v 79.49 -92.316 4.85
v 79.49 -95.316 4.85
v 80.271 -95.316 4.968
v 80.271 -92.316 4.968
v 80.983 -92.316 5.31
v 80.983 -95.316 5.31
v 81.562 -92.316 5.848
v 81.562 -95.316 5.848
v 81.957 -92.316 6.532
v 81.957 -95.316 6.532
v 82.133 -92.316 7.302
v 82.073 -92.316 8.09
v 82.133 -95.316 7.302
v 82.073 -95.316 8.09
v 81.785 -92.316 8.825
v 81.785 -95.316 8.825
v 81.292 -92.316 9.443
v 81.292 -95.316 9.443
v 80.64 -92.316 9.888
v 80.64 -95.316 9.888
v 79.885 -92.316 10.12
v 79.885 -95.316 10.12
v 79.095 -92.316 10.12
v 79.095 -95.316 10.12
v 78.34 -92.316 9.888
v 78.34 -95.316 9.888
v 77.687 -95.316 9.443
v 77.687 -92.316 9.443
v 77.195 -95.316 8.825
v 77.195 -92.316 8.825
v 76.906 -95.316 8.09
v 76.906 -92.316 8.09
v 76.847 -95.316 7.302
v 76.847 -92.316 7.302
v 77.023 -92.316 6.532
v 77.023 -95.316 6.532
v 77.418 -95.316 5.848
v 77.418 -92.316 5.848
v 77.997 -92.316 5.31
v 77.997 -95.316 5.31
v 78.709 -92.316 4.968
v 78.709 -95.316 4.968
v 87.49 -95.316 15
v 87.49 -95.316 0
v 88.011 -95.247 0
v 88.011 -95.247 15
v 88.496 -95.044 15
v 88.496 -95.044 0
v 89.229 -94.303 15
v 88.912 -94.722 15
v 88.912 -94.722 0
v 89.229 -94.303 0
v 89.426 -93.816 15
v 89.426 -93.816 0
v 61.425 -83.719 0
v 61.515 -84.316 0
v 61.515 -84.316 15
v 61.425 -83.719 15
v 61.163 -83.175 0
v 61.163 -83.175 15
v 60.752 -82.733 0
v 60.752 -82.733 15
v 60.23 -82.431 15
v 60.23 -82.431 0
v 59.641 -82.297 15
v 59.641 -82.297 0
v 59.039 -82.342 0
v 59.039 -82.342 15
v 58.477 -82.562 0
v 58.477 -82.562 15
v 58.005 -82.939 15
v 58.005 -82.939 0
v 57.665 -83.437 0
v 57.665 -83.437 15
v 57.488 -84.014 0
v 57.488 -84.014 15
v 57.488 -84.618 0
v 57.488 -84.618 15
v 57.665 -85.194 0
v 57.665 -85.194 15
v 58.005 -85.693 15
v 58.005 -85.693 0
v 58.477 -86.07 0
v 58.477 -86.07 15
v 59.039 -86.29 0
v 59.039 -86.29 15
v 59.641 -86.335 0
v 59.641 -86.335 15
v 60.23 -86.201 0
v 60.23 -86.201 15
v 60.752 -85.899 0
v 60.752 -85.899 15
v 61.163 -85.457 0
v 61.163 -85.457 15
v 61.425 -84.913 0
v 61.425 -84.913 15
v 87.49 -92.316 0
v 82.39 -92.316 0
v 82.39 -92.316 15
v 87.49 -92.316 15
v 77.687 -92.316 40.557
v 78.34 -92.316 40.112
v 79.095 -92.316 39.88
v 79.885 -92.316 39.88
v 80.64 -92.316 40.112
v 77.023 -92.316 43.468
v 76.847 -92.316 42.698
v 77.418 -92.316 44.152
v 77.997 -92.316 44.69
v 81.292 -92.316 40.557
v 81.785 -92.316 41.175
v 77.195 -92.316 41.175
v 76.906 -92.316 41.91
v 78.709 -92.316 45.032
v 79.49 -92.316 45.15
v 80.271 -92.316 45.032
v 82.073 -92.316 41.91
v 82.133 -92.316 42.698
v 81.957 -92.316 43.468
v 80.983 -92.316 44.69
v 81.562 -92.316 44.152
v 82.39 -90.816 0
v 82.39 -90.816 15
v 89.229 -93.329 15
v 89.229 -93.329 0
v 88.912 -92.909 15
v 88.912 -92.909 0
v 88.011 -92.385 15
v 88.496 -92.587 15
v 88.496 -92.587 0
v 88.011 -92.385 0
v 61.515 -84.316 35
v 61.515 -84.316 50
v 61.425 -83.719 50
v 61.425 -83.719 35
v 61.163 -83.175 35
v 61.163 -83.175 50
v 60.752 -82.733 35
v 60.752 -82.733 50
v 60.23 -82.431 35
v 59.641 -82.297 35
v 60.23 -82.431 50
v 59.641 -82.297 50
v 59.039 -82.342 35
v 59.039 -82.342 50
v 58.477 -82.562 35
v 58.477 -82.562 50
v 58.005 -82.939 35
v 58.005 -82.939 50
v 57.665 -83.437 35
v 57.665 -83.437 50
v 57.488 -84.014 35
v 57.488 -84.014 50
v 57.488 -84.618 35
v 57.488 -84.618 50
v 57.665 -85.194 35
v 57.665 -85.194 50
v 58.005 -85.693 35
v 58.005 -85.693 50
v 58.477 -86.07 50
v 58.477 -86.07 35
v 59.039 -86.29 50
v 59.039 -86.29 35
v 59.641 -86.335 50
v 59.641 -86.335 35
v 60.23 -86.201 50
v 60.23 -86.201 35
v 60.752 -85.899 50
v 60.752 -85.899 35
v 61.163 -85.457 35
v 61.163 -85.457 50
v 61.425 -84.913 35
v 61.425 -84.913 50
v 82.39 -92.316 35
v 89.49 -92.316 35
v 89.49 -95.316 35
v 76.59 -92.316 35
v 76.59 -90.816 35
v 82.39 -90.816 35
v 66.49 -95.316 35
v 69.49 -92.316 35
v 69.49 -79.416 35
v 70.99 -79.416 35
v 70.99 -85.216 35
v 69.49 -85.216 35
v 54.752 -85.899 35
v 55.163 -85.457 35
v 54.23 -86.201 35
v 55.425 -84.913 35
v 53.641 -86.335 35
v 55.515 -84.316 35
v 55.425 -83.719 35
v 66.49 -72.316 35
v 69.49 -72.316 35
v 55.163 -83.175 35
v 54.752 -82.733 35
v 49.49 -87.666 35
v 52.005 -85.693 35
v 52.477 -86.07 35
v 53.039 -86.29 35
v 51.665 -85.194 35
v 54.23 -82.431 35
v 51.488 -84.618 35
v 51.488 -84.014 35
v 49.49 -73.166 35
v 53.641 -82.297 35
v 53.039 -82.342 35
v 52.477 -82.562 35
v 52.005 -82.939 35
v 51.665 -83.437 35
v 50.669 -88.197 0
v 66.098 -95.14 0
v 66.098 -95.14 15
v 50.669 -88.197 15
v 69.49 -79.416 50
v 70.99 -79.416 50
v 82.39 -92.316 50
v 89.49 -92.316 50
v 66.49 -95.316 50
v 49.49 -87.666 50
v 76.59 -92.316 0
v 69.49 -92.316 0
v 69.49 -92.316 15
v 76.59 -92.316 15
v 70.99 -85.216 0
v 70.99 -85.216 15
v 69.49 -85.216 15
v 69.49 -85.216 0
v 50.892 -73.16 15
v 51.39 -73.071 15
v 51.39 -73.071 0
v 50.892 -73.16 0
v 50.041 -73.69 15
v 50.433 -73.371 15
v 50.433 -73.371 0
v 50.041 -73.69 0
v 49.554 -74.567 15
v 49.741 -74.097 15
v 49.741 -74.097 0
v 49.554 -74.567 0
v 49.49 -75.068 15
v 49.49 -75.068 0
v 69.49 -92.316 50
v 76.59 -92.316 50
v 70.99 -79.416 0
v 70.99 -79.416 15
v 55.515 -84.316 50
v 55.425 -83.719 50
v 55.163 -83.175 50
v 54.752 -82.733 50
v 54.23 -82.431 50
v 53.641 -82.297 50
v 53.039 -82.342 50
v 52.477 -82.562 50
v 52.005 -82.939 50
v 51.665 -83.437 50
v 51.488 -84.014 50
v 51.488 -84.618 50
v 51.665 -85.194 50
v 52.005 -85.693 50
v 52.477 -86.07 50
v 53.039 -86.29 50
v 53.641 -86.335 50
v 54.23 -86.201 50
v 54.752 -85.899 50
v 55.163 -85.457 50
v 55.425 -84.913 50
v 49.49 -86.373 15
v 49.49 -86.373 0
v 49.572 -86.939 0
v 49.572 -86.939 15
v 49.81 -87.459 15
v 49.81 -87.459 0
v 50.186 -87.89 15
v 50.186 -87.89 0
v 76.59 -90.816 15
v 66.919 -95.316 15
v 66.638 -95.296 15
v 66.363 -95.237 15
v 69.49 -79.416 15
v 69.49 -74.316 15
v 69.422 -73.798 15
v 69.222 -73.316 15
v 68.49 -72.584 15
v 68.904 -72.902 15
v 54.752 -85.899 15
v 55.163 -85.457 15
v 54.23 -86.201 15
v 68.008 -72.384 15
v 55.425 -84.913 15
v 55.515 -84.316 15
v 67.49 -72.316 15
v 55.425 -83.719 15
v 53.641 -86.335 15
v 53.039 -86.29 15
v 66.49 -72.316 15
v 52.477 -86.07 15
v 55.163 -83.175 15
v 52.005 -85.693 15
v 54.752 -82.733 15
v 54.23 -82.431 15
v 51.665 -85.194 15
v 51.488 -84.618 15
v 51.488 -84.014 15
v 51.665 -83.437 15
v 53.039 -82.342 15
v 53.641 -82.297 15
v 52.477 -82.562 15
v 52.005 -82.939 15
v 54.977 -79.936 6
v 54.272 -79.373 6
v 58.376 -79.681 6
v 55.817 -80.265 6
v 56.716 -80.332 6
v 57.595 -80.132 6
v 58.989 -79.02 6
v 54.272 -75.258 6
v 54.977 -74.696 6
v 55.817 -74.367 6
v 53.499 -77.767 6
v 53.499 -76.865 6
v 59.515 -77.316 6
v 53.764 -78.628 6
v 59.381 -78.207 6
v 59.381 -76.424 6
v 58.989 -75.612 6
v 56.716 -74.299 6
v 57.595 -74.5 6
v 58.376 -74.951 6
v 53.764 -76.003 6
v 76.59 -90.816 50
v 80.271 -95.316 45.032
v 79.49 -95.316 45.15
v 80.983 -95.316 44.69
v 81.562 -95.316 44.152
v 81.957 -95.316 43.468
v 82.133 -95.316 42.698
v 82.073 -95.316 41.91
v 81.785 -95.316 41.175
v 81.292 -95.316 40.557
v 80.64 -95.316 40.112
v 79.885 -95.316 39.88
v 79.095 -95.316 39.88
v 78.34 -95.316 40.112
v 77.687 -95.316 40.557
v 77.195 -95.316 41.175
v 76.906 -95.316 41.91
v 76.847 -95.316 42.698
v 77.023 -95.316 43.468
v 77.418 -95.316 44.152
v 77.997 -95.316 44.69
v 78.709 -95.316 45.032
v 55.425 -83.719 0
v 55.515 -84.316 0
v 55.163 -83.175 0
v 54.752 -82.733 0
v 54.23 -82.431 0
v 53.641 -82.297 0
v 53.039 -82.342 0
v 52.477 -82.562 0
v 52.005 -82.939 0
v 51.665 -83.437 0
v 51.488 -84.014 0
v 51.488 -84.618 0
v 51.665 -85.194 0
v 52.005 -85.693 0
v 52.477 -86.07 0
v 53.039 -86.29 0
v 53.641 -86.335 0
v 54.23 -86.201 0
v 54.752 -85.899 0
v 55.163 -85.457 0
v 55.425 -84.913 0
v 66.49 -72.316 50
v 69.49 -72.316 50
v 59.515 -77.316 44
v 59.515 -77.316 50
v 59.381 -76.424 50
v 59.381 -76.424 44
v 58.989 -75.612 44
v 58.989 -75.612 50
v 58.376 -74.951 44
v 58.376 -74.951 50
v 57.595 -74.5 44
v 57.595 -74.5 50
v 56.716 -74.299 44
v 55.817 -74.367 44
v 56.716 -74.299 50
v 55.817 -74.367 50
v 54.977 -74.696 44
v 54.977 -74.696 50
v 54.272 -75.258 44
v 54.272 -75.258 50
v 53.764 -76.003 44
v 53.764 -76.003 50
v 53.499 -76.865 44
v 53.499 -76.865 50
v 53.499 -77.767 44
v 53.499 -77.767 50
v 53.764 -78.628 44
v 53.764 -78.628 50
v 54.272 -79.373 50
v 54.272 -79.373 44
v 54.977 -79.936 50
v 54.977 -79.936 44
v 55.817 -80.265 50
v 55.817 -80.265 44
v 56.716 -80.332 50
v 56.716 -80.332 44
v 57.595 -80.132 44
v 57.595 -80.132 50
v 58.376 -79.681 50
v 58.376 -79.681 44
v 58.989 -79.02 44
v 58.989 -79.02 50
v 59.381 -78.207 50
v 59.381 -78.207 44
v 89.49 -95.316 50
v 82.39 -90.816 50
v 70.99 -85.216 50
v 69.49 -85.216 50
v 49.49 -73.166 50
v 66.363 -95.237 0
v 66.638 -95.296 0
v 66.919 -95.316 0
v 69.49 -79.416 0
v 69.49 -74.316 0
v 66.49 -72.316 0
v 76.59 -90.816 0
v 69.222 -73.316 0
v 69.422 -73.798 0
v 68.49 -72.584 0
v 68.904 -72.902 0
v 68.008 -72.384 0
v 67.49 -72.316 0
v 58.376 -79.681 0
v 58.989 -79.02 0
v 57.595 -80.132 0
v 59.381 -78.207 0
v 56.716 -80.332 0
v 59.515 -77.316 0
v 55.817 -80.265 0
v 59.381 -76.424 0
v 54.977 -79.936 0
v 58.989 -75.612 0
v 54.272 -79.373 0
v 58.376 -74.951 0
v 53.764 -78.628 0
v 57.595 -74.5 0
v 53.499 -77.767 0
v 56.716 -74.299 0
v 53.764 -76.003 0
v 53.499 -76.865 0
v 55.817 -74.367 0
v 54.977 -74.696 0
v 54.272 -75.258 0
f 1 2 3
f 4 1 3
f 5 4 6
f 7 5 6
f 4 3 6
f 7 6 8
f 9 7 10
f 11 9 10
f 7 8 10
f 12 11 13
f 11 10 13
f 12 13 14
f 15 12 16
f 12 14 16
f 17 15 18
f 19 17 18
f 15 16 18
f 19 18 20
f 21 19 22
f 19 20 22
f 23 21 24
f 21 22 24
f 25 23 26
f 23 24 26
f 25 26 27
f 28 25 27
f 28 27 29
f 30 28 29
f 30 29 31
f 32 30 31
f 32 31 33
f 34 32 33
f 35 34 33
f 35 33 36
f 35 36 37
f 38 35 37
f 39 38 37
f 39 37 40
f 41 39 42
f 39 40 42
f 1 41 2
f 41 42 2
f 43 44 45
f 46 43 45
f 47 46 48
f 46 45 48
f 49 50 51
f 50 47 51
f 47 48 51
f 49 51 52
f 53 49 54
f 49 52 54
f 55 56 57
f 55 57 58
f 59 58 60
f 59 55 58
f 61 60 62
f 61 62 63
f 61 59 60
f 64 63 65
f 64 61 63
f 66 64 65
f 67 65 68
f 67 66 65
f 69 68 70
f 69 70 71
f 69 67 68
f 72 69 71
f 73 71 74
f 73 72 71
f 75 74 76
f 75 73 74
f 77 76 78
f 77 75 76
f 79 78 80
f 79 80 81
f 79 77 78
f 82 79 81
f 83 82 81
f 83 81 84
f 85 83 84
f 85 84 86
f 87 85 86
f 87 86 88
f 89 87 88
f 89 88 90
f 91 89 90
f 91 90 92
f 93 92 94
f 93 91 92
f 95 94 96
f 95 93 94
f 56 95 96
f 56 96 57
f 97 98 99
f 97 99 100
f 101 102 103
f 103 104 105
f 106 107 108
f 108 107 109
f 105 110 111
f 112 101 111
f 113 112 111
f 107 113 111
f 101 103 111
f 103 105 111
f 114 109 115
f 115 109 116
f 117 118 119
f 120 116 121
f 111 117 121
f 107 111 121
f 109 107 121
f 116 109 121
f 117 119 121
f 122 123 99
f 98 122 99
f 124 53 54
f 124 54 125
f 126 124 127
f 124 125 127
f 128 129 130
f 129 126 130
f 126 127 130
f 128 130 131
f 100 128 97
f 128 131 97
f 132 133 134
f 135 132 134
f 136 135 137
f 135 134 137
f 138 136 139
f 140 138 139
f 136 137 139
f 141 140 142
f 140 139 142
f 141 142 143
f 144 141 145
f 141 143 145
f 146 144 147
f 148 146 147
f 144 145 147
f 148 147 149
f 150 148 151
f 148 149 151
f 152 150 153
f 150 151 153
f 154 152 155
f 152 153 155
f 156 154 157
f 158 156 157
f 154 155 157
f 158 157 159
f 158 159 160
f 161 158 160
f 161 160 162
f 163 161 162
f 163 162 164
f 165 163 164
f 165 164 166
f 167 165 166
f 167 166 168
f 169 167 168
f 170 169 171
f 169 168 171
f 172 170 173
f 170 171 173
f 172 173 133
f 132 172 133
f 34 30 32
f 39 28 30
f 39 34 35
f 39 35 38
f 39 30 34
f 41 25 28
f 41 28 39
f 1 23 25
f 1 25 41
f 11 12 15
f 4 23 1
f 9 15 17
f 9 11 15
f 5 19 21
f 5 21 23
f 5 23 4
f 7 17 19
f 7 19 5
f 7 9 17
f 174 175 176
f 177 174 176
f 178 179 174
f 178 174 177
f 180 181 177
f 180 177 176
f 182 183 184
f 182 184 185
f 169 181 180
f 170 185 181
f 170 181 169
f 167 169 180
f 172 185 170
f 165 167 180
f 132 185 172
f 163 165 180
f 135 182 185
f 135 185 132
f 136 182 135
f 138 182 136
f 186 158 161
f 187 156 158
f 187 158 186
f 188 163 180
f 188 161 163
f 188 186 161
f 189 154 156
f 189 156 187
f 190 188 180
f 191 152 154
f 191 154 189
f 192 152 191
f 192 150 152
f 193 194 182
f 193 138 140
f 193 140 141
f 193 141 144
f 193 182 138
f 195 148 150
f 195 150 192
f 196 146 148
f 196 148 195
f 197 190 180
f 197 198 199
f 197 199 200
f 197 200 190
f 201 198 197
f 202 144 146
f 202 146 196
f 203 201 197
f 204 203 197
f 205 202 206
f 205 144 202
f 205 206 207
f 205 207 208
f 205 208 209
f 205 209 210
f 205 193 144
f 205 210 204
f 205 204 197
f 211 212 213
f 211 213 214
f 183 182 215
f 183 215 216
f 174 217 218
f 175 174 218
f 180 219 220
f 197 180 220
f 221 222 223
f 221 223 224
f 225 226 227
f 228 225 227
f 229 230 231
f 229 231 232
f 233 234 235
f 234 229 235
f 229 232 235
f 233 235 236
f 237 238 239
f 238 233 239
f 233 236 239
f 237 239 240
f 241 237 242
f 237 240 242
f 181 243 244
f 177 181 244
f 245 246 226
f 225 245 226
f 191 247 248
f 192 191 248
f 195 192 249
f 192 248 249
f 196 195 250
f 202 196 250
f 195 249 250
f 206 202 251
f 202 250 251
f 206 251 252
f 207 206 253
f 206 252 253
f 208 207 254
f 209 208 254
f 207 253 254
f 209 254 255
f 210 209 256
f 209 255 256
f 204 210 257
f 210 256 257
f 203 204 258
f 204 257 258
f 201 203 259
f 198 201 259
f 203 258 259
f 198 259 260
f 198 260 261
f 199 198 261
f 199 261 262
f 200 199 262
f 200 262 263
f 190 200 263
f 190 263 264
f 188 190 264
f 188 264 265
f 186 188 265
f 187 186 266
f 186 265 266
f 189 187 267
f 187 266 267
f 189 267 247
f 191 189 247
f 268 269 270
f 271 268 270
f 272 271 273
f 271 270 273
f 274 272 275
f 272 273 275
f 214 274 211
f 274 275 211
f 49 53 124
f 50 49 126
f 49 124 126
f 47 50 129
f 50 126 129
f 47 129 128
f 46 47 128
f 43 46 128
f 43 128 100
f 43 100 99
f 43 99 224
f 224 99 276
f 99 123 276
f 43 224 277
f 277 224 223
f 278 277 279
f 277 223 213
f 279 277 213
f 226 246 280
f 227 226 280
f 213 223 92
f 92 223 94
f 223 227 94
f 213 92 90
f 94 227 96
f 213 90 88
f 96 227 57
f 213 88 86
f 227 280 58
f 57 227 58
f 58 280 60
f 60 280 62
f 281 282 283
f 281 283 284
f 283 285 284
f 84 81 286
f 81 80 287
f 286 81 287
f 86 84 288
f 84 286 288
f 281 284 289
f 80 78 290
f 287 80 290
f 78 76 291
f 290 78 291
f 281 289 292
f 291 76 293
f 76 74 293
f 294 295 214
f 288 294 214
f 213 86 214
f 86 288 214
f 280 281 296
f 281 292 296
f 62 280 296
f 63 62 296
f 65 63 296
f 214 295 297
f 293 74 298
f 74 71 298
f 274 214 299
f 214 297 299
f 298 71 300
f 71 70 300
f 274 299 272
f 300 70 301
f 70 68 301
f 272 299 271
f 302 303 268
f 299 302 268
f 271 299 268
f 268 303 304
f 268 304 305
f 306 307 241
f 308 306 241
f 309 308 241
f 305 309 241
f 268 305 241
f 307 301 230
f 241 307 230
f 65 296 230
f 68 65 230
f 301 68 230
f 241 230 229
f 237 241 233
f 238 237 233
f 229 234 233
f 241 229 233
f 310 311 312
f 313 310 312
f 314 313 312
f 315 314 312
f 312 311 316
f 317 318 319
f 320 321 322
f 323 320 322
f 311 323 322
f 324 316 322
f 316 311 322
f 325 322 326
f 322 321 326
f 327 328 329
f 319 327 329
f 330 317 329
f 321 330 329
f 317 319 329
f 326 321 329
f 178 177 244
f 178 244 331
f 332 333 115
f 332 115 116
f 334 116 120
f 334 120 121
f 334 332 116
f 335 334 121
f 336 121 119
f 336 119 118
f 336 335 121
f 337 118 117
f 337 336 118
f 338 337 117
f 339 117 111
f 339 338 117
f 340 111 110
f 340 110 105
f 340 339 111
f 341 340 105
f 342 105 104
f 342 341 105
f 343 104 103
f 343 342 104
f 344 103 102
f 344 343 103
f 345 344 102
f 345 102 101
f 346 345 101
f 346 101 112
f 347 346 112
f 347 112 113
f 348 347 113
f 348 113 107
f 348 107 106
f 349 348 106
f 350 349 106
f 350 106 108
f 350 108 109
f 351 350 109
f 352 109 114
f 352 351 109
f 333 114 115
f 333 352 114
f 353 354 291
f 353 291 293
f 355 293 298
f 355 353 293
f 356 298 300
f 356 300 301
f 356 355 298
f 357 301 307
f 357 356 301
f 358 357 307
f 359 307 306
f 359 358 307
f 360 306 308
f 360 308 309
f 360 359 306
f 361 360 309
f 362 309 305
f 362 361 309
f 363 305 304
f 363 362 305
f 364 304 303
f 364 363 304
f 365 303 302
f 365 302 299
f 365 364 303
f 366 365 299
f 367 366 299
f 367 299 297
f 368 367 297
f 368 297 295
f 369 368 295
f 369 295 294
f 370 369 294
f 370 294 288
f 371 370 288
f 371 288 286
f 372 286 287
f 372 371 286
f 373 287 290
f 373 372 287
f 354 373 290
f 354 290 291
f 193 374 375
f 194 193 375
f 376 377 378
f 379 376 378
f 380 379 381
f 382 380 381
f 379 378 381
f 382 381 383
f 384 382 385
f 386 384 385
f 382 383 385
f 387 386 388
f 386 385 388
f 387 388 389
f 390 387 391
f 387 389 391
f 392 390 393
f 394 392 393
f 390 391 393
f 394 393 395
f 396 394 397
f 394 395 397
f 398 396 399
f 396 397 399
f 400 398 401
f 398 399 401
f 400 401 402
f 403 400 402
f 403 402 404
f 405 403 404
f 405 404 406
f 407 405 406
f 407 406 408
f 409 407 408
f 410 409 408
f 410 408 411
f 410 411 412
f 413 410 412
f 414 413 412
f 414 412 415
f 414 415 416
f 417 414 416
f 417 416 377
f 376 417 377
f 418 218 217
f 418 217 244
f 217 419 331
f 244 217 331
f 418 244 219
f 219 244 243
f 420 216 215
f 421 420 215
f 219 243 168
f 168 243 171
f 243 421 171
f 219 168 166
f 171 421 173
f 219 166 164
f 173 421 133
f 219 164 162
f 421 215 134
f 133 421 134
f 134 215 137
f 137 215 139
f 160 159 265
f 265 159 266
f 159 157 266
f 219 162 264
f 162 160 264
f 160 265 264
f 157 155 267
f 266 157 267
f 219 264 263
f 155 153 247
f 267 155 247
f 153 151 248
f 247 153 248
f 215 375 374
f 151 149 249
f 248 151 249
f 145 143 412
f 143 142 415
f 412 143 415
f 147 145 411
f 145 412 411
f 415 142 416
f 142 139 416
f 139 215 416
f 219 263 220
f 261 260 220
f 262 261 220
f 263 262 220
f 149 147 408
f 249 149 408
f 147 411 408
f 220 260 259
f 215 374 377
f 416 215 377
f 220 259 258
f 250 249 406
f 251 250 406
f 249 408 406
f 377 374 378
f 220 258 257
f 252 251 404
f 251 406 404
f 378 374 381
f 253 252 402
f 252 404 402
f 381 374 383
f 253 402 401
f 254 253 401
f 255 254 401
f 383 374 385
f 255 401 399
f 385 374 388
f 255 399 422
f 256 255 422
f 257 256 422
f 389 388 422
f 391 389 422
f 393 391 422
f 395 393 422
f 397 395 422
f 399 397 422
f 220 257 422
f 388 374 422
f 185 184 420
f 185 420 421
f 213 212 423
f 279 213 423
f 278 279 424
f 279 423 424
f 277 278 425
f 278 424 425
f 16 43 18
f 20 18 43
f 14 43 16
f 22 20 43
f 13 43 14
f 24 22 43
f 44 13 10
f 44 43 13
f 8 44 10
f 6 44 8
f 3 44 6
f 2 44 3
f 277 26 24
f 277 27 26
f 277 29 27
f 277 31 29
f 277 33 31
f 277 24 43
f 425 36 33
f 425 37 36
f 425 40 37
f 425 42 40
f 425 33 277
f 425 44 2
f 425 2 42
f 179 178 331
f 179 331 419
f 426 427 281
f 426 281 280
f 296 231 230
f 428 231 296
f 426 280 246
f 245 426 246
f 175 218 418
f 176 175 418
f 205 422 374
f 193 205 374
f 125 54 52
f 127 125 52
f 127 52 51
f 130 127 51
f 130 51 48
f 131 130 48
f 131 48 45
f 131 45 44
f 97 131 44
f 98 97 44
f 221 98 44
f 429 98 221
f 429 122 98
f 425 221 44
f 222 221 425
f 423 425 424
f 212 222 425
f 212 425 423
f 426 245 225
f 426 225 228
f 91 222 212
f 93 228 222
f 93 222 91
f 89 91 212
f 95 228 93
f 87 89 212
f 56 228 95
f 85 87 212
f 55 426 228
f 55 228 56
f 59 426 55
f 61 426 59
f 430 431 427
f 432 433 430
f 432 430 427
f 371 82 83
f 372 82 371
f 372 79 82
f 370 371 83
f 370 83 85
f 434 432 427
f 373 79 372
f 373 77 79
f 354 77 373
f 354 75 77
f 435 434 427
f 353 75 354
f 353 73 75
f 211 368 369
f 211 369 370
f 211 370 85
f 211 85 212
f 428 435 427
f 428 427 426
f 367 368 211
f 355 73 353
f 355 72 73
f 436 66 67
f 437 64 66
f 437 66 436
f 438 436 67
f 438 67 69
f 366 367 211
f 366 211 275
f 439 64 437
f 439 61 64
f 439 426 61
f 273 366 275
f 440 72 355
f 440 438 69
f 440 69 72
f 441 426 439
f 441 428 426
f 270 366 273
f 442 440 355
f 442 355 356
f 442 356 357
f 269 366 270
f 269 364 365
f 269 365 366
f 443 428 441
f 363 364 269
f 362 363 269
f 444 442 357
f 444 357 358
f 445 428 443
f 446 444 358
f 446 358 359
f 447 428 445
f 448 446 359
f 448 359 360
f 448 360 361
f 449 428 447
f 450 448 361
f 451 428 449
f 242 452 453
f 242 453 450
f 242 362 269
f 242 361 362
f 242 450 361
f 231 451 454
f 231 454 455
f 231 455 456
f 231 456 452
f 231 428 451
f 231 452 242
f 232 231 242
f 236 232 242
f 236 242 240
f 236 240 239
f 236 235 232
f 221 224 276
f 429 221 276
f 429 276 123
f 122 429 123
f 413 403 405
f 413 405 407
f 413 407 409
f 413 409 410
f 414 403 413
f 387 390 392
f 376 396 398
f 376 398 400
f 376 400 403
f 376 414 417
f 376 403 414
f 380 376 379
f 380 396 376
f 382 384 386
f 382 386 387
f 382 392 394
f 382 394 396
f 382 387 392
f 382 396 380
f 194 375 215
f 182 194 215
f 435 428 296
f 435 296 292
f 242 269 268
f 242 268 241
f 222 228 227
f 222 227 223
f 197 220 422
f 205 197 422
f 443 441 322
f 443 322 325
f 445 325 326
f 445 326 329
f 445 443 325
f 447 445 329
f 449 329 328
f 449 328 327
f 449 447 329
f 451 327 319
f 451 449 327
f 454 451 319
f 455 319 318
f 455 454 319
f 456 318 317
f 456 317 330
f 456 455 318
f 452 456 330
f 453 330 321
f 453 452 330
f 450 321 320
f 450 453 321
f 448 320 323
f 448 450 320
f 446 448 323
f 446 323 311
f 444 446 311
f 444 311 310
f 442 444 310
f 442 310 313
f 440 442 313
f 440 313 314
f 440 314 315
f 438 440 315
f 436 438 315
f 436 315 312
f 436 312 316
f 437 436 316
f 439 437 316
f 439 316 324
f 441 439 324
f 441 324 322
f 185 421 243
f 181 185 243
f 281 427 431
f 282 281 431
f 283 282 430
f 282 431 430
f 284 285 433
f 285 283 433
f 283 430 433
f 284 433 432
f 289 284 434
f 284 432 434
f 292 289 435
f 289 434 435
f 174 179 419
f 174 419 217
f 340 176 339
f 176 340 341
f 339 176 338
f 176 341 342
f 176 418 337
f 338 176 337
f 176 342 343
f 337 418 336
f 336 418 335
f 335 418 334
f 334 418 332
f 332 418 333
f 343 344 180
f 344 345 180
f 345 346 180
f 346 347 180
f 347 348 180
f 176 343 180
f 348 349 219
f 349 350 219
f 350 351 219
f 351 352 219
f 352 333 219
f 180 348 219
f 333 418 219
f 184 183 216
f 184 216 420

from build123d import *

# Parameters (mm, degrees)
SKETCH1_R           = 3.025
SKETCH1_R_2         = 2.025
BOSS_EXTRUDE1_DEPTH = 15
BOSS_EXTRUDE2_START = 6
SKETCH1_2_R         = 3.025
BOSS_EXTRUDE2_DEPTH = 9
SKETCH2_R           = 2.65
CUT_EXTRUDE1_DEPTH  = 3
FILLET1_R           = 2


with BuildPart() as part:
    # Sketch1 → Boss-Extrude1 (new body)
    with BuildSketch(Plane.XY):
        Polygon((66.489922843, -72.31585339), (69.489922843, -72.31585339), (69.489922843, -79.41585339), (70.989922843, -79.41585339), (70.989922843, -85.21585339), (69.489922843, -85.21585339), (69.489922843, -92.31585339), (76.589922843, -92.31585339), (76.589922843, -90.81585339), (82.389922843, -90.81585339), (82.389922843, -92.31585339), (89.489922843, -92.31585339), (89.489922843, -95.31585339), (66.489922843, -95.31585339), (49.489922843, -87.66585339), (49.489922843, -73.16585339), align=None)
        with Locations((56.489922843, -77.31585339)):
            Circle(SKETCH1_R, mode=Mode.SUBTRACT)
        with Locations((53.489922843, -84.31585339)):
            Circle(SKETCH1_R_2, mode=Mode.SUBTRACT)
        with Locations((59.489922843, -84.31585339)):
            Circle(SKETCH1_R_2, mode=Mode.SUBTRACT)
    extrude(amount=BOSS_EXTRUDE1_DEPTH)

    # Sketch1<2> → Boss-Extrude2 (add)
    with BuildSketch(Plane.XY.offset(BOSS_EXTRUDE2_START)):
        with Locations((56.489922843, -77.31585339)):
            Circle(SKETCH1_2_R)
    extrude(amount=BOSS_EXTRUDE2_DEPTH)

    # Sketch2 → Cut-Extrude1 (cut)
    with BuildSketch(Plane.XZ.offset(95.31585339)):
        with Locations(Location((79.489922843, 7.5, 0), (0, 0, 270))):
            Circle(SKETCH2_R)
    extrude(amount=-CUT_EXTRUDE1_DEPTH, mode=Mode.SUBTRACT)


with BuildPart() as body_2:
    # Mirror4: mirrored copy
    add(part.part.mirror(Plane.XY.offset(25)))


with BuildPart() as part_1:
    add(part.part)

    # Fillet1
    # the kernel refuses this fillet: 2 mm, written as the material it takes off along each edge
    with BuildSketch(Plane(origin=(89.489922843, -95.31585339, -5), x_dir=(0, 1, 0), z_dir=(0, 0, 1)), Plane(origin=(89.489922843, -92.31585339, -5), x_dir=(-1, 0, 0), z_dir=(0, 0, 1)), Plane(origin=(69.489922843, -72.31585339, -5), x_dir=(-1, 0, 0), z_dir=(0, 0, 1))) as fillet1_piece_1:
        with BuildLine():
            CenterArc((FILLET1_R, FILLET1_R), FILLET1_R, 180, 90)
            Line((0, FILLET1_R), (0, 0))
            Line((0, 0), (FILLET1_R, 0))
        make_face()
    extrude(amount=25, mode=Mode.SUBTRACT)
    with BuildSketch(Plane(origin=(66.489922843, -95.31585339, -1.073173444), x_dir=(1, 0, 0), z_dir=(0, 0, 1))) as fillet1_piece_2:
        with BuildLine():
            CenterArc((FILLET1_R * 0.214634688829, FILLET1_R), FILLET1_R, 245.772254682, 24.227745318)
            Line((-FILLET1_R * 0.1957299885, FILLET1_R * 0.0880784948249), (0, 0))
            Line((0, 0), (FILLET1_R * 0.214634688829, 0))
        make_face()
    extrude(amount=17.146346888, mode=Mode.SUBTRACT)
    with BuildSketch(Plane(origin=(49.489922843, -87.66585339, -3.23292805), x_dir=(0, 1, 0), z_dir=(0, 0, 1))) as fillet1_piece_3:
        with BuildLine():
            CenterArc((FILLET1_R * 0.646585609973, -FILLET1_R), FILLET1_R, 90, 65.772254682)
            Line((-FILLET1_R * 0.265335895202, -FILLET1_R * 0.589635322671), (0, 0))
            Line((0, 0), (FILLET1_R * 0.646585609973, 0))
        make_face()
    extrude(amount=21.4658561, mode=Mode.SUBTRACT)
    with BuildSketch(Plane(origin=(49.489922843, -73.16585339, -4.756246099), x_dir=(0.9987523388778446, 0.0499376169438941, 0), z_dir=(0, 0, 1))) as fillet1_piece_4:
        with BuildLine():
            CenterArc((FILLET1_R * 0.951249219725, -FILLET1_R), FILLET1_R, 90, 87.137594774)
            Line((-FILLET1_R * 0.0475031191528, -FILLET1_R * 0.950062383056), (0, 0))
            Line((0, 0), (FILLET1_R * 0.951249219725, 0))
        make_face()
    extrude(amount=24.512492197, mode=Mode.SUBTRACT)


solid = Compound([body_2.part, part_1.part])
